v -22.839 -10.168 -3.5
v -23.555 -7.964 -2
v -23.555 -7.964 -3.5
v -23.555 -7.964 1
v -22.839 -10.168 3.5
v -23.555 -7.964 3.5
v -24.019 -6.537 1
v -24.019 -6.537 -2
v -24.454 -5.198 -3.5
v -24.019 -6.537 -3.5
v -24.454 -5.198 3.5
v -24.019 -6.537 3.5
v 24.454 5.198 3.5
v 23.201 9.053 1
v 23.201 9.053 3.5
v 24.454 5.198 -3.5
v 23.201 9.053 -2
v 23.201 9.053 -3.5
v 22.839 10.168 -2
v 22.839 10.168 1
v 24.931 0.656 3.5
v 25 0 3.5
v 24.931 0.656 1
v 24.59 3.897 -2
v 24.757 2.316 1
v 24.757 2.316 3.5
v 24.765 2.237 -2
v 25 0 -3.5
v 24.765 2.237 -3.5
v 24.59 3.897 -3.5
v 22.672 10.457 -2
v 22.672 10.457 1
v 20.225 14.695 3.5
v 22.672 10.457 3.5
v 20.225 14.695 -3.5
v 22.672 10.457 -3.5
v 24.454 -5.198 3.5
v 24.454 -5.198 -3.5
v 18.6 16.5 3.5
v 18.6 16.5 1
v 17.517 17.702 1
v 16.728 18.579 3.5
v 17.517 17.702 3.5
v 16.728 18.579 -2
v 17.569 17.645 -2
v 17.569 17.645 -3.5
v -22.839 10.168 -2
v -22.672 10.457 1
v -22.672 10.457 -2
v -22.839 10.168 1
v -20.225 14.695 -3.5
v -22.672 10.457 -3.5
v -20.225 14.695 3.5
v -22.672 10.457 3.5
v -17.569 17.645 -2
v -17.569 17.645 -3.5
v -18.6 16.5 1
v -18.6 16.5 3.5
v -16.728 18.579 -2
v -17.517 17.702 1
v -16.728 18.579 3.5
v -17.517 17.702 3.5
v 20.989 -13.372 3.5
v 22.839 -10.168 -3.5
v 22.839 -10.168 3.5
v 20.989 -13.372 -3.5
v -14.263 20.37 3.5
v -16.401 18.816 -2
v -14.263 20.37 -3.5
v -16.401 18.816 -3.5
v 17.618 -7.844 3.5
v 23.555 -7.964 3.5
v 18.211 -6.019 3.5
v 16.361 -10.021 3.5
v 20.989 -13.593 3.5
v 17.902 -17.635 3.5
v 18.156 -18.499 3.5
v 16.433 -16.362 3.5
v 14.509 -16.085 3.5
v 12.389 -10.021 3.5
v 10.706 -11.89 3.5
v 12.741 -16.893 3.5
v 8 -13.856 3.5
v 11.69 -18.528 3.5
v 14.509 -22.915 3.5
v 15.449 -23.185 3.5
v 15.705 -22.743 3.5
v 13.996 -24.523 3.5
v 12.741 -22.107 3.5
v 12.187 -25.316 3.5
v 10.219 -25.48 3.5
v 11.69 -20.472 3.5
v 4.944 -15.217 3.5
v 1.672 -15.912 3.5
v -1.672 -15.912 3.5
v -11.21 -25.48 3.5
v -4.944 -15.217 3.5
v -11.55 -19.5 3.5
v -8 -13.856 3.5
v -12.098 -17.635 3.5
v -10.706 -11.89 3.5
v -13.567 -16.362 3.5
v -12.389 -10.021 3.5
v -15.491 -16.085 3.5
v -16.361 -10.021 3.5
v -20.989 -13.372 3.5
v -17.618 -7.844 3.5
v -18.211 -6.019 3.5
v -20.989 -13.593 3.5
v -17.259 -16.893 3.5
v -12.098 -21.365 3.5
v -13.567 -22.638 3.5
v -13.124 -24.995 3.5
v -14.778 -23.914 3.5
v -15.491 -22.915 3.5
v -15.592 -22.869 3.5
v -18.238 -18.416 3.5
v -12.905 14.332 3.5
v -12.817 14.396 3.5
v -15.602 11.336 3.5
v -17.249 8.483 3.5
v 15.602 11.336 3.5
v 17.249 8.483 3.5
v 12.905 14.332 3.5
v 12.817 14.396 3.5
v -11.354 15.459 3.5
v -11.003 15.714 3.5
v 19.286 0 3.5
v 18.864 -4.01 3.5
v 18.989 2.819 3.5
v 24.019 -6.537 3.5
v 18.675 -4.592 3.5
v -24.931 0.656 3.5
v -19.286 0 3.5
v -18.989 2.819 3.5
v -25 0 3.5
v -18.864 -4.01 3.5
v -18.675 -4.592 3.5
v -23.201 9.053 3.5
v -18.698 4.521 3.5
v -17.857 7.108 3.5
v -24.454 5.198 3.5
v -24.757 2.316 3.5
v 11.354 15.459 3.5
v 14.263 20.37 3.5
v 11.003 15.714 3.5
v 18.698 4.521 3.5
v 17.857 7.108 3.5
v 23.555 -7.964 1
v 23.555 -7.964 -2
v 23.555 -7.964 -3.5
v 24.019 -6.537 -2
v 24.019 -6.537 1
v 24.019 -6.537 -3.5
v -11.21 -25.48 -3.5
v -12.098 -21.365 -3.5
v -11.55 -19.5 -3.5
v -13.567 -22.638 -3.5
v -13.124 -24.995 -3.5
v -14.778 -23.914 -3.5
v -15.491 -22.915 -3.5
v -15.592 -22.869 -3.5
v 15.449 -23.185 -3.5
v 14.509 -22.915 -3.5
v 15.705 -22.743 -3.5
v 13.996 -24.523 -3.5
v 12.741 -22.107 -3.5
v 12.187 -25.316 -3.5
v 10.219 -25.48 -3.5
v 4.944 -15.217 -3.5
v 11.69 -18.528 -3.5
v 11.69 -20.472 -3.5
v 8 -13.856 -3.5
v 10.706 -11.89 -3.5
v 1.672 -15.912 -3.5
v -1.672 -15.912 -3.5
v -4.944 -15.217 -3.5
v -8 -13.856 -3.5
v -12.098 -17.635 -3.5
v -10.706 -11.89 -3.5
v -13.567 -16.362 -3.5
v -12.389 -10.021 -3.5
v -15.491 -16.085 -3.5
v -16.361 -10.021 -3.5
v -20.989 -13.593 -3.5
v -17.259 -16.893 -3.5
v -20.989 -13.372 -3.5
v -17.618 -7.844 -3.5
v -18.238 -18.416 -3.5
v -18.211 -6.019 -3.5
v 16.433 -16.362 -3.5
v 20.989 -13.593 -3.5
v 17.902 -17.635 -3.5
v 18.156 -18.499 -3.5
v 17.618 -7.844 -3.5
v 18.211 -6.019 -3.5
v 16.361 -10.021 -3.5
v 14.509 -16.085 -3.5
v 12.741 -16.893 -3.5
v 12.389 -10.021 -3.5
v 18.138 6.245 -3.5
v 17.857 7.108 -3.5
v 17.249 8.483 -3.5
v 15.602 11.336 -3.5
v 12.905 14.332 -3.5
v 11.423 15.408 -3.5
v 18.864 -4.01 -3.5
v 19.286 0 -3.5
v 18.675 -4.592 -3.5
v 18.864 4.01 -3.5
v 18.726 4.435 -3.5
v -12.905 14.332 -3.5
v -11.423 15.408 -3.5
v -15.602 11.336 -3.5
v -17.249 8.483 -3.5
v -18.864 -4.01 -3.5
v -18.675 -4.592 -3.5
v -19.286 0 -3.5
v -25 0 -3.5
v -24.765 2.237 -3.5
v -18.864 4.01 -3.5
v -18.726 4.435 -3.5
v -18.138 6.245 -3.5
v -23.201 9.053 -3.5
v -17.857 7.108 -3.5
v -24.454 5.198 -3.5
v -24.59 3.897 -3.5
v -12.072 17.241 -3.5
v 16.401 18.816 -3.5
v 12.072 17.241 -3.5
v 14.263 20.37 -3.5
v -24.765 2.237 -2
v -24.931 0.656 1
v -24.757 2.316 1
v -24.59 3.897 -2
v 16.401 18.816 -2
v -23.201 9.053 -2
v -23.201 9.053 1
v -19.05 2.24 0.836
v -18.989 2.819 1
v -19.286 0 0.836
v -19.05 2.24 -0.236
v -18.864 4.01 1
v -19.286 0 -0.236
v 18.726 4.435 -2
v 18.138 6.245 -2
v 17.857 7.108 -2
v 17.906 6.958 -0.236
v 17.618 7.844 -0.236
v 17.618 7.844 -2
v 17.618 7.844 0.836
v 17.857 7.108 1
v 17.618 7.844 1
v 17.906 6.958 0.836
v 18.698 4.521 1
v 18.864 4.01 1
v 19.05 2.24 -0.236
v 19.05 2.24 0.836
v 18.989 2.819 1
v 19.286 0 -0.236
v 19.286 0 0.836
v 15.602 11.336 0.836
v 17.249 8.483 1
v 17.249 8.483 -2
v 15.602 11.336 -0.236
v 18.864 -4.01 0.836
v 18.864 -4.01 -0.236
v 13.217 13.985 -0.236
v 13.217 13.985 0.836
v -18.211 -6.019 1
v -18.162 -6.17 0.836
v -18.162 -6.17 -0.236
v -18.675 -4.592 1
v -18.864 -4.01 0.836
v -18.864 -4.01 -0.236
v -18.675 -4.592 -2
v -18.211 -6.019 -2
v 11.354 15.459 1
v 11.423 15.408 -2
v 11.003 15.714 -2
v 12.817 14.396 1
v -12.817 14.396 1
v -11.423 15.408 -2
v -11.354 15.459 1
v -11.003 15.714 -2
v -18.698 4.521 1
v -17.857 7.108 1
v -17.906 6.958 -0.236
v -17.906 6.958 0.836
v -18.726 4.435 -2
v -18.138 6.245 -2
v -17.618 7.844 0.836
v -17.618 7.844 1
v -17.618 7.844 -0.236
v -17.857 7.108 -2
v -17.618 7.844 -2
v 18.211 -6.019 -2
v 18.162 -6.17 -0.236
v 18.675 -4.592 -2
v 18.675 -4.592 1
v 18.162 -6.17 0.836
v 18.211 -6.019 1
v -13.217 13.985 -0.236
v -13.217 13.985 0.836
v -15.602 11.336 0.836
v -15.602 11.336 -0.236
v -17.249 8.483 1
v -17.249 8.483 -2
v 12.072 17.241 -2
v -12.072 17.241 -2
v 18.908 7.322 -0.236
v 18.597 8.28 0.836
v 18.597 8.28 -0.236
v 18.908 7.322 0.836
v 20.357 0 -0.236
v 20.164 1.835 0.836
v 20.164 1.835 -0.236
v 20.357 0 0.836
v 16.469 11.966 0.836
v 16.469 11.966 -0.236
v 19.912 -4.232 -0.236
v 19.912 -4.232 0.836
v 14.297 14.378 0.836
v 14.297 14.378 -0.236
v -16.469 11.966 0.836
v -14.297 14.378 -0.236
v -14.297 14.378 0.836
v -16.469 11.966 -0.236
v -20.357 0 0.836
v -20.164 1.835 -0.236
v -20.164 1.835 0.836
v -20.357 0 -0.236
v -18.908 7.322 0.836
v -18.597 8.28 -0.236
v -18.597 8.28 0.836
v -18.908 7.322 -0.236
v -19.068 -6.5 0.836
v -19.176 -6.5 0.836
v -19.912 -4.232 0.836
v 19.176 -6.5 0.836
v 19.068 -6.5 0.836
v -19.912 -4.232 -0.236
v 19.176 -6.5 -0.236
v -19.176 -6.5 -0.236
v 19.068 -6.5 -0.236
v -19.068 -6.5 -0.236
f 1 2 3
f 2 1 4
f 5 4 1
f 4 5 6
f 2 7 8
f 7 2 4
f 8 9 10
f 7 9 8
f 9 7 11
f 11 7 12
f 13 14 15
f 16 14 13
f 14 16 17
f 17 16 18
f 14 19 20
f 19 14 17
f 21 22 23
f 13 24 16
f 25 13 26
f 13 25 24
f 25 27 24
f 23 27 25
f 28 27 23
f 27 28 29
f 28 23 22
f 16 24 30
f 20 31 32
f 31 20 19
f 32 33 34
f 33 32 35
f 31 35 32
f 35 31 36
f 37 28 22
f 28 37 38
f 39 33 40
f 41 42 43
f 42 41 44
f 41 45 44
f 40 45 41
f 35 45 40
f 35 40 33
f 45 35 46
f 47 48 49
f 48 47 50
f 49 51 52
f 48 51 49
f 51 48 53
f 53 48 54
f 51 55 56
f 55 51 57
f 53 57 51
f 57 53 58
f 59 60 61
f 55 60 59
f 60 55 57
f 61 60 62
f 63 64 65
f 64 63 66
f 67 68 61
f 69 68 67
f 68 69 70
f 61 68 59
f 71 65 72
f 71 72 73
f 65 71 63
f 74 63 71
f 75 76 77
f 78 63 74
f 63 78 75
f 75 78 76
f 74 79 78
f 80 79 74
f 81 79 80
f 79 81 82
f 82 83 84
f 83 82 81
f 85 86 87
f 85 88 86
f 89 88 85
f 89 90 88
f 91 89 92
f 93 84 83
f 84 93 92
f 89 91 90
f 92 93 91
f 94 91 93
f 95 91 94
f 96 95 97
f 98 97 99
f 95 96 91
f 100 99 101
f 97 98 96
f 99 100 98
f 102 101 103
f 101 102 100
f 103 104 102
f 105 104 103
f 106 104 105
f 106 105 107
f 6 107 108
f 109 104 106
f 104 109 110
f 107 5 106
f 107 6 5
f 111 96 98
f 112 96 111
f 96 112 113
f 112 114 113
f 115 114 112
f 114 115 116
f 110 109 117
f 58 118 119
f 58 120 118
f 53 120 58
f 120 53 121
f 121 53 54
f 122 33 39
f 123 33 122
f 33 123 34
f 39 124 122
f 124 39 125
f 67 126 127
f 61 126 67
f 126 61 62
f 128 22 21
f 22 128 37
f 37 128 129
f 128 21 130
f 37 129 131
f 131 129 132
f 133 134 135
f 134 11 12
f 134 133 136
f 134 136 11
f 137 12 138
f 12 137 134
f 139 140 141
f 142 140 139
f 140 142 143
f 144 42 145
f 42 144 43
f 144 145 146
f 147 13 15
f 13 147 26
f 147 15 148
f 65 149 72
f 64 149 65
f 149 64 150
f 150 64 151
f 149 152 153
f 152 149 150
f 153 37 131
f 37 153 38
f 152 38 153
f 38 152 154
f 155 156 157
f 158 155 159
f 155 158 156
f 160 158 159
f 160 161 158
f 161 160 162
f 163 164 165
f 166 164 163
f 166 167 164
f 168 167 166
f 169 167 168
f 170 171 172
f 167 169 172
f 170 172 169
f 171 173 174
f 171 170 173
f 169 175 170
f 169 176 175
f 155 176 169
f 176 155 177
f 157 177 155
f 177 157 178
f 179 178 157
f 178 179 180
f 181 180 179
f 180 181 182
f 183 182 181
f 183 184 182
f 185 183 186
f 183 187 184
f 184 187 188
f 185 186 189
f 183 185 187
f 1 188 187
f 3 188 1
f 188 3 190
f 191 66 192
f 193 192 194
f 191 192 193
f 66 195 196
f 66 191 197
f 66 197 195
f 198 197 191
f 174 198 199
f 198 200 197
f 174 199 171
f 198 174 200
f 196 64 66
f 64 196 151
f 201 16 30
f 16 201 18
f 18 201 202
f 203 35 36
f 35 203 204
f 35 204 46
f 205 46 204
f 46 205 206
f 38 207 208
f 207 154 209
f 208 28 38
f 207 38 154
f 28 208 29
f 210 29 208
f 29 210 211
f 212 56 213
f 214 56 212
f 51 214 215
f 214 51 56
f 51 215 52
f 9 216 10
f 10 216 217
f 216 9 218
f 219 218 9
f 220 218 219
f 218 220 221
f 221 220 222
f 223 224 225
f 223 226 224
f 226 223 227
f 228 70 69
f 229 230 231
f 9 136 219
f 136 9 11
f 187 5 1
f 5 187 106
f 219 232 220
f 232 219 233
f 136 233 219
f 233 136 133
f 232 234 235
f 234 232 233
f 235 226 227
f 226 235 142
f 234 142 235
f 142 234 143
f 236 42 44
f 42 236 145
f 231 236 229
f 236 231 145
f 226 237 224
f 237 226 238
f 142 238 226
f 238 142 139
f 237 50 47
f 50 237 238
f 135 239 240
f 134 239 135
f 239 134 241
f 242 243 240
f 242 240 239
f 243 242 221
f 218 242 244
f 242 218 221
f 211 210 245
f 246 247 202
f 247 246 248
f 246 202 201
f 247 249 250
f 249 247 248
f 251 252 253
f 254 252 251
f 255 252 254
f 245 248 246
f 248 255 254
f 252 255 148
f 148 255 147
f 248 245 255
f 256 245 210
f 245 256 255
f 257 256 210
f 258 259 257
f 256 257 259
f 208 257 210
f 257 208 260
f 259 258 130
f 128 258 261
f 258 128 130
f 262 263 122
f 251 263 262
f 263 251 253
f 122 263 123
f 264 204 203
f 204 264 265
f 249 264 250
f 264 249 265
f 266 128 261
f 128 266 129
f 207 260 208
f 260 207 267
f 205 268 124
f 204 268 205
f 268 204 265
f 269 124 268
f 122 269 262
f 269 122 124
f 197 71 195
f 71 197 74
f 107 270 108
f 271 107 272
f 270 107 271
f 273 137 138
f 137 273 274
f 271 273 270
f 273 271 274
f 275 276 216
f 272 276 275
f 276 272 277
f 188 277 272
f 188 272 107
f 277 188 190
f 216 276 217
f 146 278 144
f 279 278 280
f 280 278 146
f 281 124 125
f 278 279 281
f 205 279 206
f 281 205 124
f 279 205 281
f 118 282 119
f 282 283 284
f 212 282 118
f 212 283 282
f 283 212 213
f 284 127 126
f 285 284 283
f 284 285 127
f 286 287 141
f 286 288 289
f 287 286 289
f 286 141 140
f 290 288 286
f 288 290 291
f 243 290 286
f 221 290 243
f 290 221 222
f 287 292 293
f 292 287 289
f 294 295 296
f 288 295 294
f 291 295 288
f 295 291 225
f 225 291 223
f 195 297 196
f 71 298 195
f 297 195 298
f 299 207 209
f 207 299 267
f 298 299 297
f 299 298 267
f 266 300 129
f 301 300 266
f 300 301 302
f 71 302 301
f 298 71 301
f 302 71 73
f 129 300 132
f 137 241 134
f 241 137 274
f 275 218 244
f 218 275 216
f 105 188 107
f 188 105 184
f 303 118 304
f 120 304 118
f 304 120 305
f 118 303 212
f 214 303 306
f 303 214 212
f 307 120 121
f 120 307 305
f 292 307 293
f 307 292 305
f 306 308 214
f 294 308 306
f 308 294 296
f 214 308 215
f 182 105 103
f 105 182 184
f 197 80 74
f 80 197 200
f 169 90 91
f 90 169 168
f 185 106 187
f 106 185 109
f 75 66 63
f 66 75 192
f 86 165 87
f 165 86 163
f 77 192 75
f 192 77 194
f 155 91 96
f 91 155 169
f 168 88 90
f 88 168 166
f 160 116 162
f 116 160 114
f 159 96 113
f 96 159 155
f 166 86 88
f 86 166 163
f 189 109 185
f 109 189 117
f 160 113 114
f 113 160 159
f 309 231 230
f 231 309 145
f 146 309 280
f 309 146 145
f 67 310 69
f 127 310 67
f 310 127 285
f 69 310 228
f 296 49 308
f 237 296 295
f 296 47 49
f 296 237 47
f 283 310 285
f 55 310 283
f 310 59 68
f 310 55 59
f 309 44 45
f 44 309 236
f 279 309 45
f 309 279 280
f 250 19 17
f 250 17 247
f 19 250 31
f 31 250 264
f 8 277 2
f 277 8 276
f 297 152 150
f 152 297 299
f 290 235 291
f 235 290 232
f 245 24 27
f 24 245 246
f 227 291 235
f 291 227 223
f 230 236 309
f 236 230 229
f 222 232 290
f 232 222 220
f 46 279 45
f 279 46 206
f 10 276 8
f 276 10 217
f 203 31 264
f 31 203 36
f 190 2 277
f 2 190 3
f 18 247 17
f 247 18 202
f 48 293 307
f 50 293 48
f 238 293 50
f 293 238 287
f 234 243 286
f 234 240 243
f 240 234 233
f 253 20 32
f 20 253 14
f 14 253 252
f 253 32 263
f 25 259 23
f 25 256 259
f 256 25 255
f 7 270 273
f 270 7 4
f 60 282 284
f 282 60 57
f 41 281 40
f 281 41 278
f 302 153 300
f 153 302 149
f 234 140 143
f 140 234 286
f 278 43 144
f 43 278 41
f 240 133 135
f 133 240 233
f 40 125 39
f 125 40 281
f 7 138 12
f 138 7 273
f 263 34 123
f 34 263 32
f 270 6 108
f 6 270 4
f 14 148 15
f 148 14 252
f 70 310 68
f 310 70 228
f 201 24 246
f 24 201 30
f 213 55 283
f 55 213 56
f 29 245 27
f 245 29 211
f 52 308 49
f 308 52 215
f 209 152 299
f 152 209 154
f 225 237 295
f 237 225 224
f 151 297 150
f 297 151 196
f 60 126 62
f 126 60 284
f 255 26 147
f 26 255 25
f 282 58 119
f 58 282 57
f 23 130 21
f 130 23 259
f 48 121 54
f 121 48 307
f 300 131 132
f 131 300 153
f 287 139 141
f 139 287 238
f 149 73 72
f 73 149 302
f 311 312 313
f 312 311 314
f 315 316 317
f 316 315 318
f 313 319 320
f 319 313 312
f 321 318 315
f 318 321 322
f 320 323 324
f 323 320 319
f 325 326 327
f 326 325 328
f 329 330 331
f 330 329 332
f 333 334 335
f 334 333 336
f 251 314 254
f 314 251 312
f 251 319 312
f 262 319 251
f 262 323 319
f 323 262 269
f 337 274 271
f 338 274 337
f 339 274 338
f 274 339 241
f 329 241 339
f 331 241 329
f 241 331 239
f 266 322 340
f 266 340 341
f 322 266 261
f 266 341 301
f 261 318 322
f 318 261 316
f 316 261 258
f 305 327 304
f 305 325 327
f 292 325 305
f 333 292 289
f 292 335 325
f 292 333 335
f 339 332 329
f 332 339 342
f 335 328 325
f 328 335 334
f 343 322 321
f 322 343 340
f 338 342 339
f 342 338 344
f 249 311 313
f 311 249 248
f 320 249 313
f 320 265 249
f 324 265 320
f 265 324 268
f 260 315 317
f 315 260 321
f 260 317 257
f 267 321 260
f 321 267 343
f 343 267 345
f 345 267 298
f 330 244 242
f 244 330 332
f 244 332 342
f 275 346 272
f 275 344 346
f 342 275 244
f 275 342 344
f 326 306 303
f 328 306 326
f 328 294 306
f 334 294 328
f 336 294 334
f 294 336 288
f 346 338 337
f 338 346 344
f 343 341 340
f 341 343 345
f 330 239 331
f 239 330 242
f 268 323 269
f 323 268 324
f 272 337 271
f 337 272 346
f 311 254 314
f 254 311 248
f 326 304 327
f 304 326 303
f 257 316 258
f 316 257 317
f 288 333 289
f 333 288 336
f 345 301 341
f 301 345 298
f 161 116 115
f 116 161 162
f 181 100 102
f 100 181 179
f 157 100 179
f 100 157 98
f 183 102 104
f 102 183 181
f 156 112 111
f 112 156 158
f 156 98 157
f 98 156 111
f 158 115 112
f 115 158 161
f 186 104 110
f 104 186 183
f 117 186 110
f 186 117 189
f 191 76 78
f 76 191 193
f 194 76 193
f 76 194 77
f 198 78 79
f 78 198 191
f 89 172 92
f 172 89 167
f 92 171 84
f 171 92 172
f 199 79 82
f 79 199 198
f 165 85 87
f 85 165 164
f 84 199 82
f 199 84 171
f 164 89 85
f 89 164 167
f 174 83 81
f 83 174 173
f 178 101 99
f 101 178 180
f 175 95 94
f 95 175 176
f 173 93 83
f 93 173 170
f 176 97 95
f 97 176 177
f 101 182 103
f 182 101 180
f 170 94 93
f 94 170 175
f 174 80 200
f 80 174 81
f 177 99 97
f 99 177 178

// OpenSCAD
use <MCAD/triangles.scad>

//$fa=0.01;
//$fs=0.5;

pinHole=-19.5;

ringw=7;
angle=70;
dia=25;

module nt55() {
	cylinder(r=10,h=145,center=true);
}

module se2a() {
	cylinder(r=11,h=162,center=true);
}

module ring() {
	difference() {
		union() {
			difference() {
				cylinder(r=dia,h=ringw,center=true);
				cylinder(r=(dia-(dia/4.375)),h=ringw+2,center=true);
				translate([0,-29,0]) {
					cube([(dia*2.05714285714286),(dia*0.57142857142857),ringw+2],center=true);
				}
			}
			hull() {
				translate([-(dia*0.42857142857143),pinHole,0])
				cylinder(r=6,h=ringw,center=true);
				translate([(dia*0.42857142857143),pinHole,0])
				cylinder(r=6,h=ringw,center=true);
	
				translate([0,-(dia*0.47228571428571),0]) {
					cube([(dia*1.67914285714286),(dia/7),ringw],center=true);
				}
			}	
		}
	}
}

module innerNotches() {
	translate([0,0,(ringw/2)-3.2])
	intersection() {
		difference() {
			cylinder(r=(dia*0.81428571428571),h=(dia*0.04285714285714),center=true);
			
			cylinder(r=(dia*0.75714285714286),h=(dia*0.07142857142857),center=true);
		
			translate([0,-(dia*0.54571428571429),0]) {
				cube([(dia*1.67142857142857),(dia*0.57142857142857),ringw],center=true);
			}
		}
		
		translate([0,(dia*0.19228571428571),0]) {
			rotate([0,0,20])
			cube([(dia*2.14285714285714),(dia*0.32828571428571),(dia*0.04285714285714)],center=true);
			rotate([0,0,-20])
			cube([(dia*2.14285714285714),(dia*0.32828571428571),(dia*0.04285714285714)],center=true);
		}
	}
}

module notchset() {
		union() {
			translate([0,(dia*0.14285714285714),-1])
				cube([75,1.5,3],center=true);
			translate([0,-5,-1])
				cube([75,1.5,3],center=true);
			
			translate([0,0,-ringw])
			union() {
				translate([0,5,0])
				cube([75,1.5,3],center=true);
				translate([0,-5,0])
				cube([75,1.5,3],center=true);
			}
		}
}

module notches() {		
	translate([0,0,ringw/2]) {
		translate([-2,6,0])
		rotate([0,0,20])
		notchset(); 
	
		translate([2,6,0])
		rotate([0,0,-20])
		notchset();
	}
}

module topNotch() {
	union() {
		translate([0,40,-((ringw/2)+ringw/4)])
		rotate([0,0,-90])
			a_triangle(angle/2,40,ringw*1.5);
		
		translate([0,40,((ringw/2)+ringw/4)])
		rotate([0,180,-270])
			a_triangle(angle/2,40,ringw*1.5);		
		
		translate([0,31,0])
			cube([1,10,ringw],center=true);
	}
}

module shockMountEnd() {
	difference() {
		ring();
		topNotch();
		notches();
		color("red")
			innerNotches();
		translate([-15,pinHole,0])
		cylinder(r=3.45,h=ringw*1.5,center=true);
		translate([15,pinHole,0])
		cylinder(r=3.45,h=ringw*1.5,center=true);
		cylinder(r=16,h=ringw*1.5,center=true);
	}
}


//translate([0,0,-5])
//cube(11);

//translate([0,0,0])
//nt55();

shockMountEnd();
